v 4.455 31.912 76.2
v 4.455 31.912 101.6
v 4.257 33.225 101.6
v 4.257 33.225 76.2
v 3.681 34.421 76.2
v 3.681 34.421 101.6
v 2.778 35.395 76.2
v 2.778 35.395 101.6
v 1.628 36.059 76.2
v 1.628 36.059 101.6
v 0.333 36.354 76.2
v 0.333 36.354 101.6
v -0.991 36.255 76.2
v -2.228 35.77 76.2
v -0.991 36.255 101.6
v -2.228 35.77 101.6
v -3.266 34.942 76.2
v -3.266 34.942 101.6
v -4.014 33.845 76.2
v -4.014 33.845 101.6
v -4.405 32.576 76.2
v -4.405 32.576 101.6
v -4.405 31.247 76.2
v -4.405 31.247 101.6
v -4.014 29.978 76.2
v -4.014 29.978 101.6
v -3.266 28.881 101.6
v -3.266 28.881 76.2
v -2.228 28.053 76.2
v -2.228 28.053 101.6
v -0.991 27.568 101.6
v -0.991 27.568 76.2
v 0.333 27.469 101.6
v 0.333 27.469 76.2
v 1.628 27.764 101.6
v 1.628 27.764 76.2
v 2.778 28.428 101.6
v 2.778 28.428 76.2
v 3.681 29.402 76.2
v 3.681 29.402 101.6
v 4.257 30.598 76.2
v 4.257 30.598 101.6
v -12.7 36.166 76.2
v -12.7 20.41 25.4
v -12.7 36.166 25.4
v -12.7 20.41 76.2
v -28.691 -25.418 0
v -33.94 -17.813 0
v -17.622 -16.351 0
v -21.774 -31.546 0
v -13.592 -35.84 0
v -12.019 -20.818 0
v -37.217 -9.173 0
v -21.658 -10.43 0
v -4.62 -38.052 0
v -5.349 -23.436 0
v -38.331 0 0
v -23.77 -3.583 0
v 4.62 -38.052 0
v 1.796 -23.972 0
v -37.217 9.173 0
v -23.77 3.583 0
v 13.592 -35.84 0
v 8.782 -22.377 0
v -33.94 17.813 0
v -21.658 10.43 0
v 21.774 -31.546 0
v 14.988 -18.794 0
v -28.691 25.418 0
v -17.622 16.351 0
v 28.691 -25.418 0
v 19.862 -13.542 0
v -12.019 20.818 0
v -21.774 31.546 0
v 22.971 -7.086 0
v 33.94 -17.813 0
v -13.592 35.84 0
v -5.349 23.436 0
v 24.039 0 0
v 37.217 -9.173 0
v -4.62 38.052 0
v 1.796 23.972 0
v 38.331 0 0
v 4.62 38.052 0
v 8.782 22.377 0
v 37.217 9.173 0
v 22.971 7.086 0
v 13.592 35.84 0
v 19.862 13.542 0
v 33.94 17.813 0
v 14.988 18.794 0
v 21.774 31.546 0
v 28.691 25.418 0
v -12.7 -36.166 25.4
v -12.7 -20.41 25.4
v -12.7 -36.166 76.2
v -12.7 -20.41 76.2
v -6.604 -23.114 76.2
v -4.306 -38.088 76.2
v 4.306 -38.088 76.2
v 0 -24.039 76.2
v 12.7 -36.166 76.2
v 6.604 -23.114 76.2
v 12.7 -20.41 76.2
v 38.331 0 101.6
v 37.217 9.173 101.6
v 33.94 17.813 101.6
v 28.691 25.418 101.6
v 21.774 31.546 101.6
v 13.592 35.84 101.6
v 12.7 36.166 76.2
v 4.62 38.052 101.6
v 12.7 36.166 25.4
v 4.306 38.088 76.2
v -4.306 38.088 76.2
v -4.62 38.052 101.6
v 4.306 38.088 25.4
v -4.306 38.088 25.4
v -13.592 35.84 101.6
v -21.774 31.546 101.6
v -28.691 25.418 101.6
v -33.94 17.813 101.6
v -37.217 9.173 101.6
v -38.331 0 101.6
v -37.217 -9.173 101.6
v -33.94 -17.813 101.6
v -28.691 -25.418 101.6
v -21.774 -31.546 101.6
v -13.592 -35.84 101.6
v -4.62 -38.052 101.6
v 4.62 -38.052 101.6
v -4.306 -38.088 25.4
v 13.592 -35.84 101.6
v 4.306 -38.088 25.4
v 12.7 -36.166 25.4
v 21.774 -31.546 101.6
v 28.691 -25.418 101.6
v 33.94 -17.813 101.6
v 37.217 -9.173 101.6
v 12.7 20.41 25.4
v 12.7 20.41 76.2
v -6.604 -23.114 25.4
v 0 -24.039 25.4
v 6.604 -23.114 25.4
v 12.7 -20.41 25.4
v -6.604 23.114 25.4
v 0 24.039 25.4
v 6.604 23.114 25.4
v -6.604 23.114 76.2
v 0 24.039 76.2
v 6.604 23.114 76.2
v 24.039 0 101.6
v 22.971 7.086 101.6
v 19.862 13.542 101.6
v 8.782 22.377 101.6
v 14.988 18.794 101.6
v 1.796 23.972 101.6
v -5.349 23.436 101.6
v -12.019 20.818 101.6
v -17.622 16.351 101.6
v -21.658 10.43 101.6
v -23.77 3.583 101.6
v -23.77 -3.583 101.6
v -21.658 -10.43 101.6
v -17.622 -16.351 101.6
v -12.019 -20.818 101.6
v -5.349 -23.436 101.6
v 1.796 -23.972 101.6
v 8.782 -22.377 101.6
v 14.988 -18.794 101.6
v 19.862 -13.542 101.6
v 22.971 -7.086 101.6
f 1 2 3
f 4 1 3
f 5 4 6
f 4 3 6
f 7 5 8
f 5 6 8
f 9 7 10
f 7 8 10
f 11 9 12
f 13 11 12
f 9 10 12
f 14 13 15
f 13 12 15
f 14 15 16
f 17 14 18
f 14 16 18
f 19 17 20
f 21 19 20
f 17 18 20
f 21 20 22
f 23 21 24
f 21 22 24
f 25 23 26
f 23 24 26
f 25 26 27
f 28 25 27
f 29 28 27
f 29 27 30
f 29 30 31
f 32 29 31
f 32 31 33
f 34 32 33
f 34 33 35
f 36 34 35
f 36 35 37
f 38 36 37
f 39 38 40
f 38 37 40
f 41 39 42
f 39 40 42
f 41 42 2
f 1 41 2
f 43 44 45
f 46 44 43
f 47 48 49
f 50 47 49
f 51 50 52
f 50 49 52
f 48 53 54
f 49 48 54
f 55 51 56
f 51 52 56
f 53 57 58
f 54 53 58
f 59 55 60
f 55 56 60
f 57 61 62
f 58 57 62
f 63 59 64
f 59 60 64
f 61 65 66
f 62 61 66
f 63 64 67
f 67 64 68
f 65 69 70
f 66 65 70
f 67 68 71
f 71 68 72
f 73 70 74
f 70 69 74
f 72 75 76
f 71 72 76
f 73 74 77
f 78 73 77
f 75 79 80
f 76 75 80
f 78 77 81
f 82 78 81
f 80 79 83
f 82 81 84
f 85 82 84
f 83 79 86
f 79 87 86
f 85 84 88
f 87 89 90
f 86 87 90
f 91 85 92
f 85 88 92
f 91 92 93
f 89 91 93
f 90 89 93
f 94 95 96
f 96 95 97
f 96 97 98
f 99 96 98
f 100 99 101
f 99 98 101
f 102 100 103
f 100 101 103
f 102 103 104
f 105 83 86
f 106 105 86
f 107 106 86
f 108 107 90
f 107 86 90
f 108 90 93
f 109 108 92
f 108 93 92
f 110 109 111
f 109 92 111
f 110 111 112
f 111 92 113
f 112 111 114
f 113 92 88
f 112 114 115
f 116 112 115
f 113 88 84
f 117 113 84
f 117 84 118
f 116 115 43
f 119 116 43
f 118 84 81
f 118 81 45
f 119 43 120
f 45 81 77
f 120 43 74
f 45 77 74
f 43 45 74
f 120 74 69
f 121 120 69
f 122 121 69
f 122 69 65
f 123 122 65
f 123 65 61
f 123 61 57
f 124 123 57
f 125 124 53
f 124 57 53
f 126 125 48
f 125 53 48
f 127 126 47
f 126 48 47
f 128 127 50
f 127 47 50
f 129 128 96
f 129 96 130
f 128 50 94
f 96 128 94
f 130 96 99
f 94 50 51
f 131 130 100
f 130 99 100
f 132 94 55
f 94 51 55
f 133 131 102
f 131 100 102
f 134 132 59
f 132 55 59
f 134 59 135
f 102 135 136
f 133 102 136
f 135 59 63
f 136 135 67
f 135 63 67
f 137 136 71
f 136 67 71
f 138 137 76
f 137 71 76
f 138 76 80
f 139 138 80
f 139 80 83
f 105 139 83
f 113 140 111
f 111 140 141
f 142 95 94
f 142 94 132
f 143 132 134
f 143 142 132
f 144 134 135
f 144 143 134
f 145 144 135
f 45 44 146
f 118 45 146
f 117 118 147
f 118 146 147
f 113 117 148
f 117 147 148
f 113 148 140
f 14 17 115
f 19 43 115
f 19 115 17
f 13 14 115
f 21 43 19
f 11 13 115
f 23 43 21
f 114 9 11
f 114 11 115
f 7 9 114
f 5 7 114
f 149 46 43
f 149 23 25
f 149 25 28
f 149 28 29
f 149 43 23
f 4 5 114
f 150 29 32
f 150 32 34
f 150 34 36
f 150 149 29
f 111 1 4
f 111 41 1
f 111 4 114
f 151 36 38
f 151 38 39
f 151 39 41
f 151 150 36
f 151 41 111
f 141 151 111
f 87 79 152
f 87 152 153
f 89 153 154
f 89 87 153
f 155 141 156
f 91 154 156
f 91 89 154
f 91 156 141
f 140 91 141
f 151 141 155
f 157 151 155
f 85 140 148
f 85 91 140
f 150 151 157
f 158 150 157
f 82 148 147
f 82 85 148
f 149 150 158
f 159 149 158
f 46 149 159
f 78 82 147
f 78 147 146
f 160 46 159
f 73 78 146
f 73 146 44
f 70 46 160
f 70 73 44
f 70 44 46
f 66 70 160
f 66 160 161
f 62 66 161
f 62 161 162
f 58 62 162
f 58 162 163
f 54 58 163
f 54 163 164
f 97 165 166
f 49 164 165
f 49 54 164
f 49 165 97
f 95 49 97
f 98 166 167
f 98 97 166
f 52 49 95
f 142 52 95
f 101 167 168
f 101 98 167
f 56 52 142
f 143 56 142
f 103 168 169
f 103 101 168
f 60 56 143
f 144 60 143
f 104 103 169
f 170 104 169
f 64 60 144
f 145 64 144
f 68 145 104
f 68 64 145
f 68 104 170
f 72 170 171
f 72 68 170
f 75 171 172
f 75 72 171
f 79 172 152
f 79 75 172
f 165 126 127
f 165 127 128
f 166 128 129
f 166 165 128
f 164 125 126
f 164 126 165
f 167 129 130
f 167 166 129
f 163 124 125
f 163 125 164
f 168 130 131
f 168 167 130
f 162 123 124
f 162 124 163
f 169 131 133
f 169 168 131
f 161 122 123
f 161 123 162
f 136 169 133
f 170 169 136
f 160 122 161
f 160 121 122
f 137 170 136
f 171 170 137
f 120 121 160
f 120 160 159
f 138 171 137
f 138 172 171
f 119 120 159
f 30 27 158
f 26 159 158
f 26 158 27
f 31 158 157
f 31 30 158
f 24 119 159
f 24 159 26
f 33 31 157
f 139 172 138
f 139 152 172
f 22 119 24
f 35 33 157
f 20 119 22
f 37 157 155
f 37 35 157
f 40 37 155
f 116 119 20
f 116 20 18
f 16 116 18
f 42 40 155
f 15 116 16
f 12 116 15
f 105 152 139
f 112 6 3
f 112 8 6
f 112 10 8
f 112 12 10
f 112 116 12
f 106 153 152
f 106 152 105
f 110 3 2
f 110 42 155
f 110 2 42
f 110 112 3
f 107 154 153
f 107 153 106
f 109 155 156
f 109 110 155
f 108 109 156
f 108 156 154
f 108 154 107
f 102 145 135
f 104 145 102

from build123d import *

# Parameters (mm, degrees)
F0_R          = 38.3309835302
F0_R_2        = 24.0387523189
F1_DEPTH      = 101.6
F2_W          = 25.4
F2_H          = 50.8
F3_DEPTH      = 38.3319835302
F3_DEPTH_BACK = 38.3319835302
F4_R          = 4.4552500981
F5_DEPTH      = 25.4


with BuildPart() as f1:
    # F0 (on Top) → F1 (new body)
    with BuildSketch(Plane.XY):
        Circle(F0_R)
        Circle(F0_R_2, mode=Mode.SUBTRACT)
    extrude(amount=F1_DEPTH)

    # F2 (on Front) → F3 (cut, two sides)
    with BuildSketch(Plane.XZ) as f3_sk:
        with Locations((0, 50.8)):
            Rectangle(F2_W, F2_H)
    extrude(amount=-F3_DEPTH, mode=Mode.SUBTRACT)
    extrude(f3_sk.sketch, amount=F3_DEPTH_BACK, mode=Mode.SUBTRACT)

    # F4 (on face) → F5 (cut, through all)
    with BuildSketch(Plane.XY.offset(101.6)):
        with Locations((0, 31.9115035236)):
            Circle(F4_R)
    extrude(amount=-F5_DEPTH, mode=Mode.SUBTRACT)


solid = f1.part
